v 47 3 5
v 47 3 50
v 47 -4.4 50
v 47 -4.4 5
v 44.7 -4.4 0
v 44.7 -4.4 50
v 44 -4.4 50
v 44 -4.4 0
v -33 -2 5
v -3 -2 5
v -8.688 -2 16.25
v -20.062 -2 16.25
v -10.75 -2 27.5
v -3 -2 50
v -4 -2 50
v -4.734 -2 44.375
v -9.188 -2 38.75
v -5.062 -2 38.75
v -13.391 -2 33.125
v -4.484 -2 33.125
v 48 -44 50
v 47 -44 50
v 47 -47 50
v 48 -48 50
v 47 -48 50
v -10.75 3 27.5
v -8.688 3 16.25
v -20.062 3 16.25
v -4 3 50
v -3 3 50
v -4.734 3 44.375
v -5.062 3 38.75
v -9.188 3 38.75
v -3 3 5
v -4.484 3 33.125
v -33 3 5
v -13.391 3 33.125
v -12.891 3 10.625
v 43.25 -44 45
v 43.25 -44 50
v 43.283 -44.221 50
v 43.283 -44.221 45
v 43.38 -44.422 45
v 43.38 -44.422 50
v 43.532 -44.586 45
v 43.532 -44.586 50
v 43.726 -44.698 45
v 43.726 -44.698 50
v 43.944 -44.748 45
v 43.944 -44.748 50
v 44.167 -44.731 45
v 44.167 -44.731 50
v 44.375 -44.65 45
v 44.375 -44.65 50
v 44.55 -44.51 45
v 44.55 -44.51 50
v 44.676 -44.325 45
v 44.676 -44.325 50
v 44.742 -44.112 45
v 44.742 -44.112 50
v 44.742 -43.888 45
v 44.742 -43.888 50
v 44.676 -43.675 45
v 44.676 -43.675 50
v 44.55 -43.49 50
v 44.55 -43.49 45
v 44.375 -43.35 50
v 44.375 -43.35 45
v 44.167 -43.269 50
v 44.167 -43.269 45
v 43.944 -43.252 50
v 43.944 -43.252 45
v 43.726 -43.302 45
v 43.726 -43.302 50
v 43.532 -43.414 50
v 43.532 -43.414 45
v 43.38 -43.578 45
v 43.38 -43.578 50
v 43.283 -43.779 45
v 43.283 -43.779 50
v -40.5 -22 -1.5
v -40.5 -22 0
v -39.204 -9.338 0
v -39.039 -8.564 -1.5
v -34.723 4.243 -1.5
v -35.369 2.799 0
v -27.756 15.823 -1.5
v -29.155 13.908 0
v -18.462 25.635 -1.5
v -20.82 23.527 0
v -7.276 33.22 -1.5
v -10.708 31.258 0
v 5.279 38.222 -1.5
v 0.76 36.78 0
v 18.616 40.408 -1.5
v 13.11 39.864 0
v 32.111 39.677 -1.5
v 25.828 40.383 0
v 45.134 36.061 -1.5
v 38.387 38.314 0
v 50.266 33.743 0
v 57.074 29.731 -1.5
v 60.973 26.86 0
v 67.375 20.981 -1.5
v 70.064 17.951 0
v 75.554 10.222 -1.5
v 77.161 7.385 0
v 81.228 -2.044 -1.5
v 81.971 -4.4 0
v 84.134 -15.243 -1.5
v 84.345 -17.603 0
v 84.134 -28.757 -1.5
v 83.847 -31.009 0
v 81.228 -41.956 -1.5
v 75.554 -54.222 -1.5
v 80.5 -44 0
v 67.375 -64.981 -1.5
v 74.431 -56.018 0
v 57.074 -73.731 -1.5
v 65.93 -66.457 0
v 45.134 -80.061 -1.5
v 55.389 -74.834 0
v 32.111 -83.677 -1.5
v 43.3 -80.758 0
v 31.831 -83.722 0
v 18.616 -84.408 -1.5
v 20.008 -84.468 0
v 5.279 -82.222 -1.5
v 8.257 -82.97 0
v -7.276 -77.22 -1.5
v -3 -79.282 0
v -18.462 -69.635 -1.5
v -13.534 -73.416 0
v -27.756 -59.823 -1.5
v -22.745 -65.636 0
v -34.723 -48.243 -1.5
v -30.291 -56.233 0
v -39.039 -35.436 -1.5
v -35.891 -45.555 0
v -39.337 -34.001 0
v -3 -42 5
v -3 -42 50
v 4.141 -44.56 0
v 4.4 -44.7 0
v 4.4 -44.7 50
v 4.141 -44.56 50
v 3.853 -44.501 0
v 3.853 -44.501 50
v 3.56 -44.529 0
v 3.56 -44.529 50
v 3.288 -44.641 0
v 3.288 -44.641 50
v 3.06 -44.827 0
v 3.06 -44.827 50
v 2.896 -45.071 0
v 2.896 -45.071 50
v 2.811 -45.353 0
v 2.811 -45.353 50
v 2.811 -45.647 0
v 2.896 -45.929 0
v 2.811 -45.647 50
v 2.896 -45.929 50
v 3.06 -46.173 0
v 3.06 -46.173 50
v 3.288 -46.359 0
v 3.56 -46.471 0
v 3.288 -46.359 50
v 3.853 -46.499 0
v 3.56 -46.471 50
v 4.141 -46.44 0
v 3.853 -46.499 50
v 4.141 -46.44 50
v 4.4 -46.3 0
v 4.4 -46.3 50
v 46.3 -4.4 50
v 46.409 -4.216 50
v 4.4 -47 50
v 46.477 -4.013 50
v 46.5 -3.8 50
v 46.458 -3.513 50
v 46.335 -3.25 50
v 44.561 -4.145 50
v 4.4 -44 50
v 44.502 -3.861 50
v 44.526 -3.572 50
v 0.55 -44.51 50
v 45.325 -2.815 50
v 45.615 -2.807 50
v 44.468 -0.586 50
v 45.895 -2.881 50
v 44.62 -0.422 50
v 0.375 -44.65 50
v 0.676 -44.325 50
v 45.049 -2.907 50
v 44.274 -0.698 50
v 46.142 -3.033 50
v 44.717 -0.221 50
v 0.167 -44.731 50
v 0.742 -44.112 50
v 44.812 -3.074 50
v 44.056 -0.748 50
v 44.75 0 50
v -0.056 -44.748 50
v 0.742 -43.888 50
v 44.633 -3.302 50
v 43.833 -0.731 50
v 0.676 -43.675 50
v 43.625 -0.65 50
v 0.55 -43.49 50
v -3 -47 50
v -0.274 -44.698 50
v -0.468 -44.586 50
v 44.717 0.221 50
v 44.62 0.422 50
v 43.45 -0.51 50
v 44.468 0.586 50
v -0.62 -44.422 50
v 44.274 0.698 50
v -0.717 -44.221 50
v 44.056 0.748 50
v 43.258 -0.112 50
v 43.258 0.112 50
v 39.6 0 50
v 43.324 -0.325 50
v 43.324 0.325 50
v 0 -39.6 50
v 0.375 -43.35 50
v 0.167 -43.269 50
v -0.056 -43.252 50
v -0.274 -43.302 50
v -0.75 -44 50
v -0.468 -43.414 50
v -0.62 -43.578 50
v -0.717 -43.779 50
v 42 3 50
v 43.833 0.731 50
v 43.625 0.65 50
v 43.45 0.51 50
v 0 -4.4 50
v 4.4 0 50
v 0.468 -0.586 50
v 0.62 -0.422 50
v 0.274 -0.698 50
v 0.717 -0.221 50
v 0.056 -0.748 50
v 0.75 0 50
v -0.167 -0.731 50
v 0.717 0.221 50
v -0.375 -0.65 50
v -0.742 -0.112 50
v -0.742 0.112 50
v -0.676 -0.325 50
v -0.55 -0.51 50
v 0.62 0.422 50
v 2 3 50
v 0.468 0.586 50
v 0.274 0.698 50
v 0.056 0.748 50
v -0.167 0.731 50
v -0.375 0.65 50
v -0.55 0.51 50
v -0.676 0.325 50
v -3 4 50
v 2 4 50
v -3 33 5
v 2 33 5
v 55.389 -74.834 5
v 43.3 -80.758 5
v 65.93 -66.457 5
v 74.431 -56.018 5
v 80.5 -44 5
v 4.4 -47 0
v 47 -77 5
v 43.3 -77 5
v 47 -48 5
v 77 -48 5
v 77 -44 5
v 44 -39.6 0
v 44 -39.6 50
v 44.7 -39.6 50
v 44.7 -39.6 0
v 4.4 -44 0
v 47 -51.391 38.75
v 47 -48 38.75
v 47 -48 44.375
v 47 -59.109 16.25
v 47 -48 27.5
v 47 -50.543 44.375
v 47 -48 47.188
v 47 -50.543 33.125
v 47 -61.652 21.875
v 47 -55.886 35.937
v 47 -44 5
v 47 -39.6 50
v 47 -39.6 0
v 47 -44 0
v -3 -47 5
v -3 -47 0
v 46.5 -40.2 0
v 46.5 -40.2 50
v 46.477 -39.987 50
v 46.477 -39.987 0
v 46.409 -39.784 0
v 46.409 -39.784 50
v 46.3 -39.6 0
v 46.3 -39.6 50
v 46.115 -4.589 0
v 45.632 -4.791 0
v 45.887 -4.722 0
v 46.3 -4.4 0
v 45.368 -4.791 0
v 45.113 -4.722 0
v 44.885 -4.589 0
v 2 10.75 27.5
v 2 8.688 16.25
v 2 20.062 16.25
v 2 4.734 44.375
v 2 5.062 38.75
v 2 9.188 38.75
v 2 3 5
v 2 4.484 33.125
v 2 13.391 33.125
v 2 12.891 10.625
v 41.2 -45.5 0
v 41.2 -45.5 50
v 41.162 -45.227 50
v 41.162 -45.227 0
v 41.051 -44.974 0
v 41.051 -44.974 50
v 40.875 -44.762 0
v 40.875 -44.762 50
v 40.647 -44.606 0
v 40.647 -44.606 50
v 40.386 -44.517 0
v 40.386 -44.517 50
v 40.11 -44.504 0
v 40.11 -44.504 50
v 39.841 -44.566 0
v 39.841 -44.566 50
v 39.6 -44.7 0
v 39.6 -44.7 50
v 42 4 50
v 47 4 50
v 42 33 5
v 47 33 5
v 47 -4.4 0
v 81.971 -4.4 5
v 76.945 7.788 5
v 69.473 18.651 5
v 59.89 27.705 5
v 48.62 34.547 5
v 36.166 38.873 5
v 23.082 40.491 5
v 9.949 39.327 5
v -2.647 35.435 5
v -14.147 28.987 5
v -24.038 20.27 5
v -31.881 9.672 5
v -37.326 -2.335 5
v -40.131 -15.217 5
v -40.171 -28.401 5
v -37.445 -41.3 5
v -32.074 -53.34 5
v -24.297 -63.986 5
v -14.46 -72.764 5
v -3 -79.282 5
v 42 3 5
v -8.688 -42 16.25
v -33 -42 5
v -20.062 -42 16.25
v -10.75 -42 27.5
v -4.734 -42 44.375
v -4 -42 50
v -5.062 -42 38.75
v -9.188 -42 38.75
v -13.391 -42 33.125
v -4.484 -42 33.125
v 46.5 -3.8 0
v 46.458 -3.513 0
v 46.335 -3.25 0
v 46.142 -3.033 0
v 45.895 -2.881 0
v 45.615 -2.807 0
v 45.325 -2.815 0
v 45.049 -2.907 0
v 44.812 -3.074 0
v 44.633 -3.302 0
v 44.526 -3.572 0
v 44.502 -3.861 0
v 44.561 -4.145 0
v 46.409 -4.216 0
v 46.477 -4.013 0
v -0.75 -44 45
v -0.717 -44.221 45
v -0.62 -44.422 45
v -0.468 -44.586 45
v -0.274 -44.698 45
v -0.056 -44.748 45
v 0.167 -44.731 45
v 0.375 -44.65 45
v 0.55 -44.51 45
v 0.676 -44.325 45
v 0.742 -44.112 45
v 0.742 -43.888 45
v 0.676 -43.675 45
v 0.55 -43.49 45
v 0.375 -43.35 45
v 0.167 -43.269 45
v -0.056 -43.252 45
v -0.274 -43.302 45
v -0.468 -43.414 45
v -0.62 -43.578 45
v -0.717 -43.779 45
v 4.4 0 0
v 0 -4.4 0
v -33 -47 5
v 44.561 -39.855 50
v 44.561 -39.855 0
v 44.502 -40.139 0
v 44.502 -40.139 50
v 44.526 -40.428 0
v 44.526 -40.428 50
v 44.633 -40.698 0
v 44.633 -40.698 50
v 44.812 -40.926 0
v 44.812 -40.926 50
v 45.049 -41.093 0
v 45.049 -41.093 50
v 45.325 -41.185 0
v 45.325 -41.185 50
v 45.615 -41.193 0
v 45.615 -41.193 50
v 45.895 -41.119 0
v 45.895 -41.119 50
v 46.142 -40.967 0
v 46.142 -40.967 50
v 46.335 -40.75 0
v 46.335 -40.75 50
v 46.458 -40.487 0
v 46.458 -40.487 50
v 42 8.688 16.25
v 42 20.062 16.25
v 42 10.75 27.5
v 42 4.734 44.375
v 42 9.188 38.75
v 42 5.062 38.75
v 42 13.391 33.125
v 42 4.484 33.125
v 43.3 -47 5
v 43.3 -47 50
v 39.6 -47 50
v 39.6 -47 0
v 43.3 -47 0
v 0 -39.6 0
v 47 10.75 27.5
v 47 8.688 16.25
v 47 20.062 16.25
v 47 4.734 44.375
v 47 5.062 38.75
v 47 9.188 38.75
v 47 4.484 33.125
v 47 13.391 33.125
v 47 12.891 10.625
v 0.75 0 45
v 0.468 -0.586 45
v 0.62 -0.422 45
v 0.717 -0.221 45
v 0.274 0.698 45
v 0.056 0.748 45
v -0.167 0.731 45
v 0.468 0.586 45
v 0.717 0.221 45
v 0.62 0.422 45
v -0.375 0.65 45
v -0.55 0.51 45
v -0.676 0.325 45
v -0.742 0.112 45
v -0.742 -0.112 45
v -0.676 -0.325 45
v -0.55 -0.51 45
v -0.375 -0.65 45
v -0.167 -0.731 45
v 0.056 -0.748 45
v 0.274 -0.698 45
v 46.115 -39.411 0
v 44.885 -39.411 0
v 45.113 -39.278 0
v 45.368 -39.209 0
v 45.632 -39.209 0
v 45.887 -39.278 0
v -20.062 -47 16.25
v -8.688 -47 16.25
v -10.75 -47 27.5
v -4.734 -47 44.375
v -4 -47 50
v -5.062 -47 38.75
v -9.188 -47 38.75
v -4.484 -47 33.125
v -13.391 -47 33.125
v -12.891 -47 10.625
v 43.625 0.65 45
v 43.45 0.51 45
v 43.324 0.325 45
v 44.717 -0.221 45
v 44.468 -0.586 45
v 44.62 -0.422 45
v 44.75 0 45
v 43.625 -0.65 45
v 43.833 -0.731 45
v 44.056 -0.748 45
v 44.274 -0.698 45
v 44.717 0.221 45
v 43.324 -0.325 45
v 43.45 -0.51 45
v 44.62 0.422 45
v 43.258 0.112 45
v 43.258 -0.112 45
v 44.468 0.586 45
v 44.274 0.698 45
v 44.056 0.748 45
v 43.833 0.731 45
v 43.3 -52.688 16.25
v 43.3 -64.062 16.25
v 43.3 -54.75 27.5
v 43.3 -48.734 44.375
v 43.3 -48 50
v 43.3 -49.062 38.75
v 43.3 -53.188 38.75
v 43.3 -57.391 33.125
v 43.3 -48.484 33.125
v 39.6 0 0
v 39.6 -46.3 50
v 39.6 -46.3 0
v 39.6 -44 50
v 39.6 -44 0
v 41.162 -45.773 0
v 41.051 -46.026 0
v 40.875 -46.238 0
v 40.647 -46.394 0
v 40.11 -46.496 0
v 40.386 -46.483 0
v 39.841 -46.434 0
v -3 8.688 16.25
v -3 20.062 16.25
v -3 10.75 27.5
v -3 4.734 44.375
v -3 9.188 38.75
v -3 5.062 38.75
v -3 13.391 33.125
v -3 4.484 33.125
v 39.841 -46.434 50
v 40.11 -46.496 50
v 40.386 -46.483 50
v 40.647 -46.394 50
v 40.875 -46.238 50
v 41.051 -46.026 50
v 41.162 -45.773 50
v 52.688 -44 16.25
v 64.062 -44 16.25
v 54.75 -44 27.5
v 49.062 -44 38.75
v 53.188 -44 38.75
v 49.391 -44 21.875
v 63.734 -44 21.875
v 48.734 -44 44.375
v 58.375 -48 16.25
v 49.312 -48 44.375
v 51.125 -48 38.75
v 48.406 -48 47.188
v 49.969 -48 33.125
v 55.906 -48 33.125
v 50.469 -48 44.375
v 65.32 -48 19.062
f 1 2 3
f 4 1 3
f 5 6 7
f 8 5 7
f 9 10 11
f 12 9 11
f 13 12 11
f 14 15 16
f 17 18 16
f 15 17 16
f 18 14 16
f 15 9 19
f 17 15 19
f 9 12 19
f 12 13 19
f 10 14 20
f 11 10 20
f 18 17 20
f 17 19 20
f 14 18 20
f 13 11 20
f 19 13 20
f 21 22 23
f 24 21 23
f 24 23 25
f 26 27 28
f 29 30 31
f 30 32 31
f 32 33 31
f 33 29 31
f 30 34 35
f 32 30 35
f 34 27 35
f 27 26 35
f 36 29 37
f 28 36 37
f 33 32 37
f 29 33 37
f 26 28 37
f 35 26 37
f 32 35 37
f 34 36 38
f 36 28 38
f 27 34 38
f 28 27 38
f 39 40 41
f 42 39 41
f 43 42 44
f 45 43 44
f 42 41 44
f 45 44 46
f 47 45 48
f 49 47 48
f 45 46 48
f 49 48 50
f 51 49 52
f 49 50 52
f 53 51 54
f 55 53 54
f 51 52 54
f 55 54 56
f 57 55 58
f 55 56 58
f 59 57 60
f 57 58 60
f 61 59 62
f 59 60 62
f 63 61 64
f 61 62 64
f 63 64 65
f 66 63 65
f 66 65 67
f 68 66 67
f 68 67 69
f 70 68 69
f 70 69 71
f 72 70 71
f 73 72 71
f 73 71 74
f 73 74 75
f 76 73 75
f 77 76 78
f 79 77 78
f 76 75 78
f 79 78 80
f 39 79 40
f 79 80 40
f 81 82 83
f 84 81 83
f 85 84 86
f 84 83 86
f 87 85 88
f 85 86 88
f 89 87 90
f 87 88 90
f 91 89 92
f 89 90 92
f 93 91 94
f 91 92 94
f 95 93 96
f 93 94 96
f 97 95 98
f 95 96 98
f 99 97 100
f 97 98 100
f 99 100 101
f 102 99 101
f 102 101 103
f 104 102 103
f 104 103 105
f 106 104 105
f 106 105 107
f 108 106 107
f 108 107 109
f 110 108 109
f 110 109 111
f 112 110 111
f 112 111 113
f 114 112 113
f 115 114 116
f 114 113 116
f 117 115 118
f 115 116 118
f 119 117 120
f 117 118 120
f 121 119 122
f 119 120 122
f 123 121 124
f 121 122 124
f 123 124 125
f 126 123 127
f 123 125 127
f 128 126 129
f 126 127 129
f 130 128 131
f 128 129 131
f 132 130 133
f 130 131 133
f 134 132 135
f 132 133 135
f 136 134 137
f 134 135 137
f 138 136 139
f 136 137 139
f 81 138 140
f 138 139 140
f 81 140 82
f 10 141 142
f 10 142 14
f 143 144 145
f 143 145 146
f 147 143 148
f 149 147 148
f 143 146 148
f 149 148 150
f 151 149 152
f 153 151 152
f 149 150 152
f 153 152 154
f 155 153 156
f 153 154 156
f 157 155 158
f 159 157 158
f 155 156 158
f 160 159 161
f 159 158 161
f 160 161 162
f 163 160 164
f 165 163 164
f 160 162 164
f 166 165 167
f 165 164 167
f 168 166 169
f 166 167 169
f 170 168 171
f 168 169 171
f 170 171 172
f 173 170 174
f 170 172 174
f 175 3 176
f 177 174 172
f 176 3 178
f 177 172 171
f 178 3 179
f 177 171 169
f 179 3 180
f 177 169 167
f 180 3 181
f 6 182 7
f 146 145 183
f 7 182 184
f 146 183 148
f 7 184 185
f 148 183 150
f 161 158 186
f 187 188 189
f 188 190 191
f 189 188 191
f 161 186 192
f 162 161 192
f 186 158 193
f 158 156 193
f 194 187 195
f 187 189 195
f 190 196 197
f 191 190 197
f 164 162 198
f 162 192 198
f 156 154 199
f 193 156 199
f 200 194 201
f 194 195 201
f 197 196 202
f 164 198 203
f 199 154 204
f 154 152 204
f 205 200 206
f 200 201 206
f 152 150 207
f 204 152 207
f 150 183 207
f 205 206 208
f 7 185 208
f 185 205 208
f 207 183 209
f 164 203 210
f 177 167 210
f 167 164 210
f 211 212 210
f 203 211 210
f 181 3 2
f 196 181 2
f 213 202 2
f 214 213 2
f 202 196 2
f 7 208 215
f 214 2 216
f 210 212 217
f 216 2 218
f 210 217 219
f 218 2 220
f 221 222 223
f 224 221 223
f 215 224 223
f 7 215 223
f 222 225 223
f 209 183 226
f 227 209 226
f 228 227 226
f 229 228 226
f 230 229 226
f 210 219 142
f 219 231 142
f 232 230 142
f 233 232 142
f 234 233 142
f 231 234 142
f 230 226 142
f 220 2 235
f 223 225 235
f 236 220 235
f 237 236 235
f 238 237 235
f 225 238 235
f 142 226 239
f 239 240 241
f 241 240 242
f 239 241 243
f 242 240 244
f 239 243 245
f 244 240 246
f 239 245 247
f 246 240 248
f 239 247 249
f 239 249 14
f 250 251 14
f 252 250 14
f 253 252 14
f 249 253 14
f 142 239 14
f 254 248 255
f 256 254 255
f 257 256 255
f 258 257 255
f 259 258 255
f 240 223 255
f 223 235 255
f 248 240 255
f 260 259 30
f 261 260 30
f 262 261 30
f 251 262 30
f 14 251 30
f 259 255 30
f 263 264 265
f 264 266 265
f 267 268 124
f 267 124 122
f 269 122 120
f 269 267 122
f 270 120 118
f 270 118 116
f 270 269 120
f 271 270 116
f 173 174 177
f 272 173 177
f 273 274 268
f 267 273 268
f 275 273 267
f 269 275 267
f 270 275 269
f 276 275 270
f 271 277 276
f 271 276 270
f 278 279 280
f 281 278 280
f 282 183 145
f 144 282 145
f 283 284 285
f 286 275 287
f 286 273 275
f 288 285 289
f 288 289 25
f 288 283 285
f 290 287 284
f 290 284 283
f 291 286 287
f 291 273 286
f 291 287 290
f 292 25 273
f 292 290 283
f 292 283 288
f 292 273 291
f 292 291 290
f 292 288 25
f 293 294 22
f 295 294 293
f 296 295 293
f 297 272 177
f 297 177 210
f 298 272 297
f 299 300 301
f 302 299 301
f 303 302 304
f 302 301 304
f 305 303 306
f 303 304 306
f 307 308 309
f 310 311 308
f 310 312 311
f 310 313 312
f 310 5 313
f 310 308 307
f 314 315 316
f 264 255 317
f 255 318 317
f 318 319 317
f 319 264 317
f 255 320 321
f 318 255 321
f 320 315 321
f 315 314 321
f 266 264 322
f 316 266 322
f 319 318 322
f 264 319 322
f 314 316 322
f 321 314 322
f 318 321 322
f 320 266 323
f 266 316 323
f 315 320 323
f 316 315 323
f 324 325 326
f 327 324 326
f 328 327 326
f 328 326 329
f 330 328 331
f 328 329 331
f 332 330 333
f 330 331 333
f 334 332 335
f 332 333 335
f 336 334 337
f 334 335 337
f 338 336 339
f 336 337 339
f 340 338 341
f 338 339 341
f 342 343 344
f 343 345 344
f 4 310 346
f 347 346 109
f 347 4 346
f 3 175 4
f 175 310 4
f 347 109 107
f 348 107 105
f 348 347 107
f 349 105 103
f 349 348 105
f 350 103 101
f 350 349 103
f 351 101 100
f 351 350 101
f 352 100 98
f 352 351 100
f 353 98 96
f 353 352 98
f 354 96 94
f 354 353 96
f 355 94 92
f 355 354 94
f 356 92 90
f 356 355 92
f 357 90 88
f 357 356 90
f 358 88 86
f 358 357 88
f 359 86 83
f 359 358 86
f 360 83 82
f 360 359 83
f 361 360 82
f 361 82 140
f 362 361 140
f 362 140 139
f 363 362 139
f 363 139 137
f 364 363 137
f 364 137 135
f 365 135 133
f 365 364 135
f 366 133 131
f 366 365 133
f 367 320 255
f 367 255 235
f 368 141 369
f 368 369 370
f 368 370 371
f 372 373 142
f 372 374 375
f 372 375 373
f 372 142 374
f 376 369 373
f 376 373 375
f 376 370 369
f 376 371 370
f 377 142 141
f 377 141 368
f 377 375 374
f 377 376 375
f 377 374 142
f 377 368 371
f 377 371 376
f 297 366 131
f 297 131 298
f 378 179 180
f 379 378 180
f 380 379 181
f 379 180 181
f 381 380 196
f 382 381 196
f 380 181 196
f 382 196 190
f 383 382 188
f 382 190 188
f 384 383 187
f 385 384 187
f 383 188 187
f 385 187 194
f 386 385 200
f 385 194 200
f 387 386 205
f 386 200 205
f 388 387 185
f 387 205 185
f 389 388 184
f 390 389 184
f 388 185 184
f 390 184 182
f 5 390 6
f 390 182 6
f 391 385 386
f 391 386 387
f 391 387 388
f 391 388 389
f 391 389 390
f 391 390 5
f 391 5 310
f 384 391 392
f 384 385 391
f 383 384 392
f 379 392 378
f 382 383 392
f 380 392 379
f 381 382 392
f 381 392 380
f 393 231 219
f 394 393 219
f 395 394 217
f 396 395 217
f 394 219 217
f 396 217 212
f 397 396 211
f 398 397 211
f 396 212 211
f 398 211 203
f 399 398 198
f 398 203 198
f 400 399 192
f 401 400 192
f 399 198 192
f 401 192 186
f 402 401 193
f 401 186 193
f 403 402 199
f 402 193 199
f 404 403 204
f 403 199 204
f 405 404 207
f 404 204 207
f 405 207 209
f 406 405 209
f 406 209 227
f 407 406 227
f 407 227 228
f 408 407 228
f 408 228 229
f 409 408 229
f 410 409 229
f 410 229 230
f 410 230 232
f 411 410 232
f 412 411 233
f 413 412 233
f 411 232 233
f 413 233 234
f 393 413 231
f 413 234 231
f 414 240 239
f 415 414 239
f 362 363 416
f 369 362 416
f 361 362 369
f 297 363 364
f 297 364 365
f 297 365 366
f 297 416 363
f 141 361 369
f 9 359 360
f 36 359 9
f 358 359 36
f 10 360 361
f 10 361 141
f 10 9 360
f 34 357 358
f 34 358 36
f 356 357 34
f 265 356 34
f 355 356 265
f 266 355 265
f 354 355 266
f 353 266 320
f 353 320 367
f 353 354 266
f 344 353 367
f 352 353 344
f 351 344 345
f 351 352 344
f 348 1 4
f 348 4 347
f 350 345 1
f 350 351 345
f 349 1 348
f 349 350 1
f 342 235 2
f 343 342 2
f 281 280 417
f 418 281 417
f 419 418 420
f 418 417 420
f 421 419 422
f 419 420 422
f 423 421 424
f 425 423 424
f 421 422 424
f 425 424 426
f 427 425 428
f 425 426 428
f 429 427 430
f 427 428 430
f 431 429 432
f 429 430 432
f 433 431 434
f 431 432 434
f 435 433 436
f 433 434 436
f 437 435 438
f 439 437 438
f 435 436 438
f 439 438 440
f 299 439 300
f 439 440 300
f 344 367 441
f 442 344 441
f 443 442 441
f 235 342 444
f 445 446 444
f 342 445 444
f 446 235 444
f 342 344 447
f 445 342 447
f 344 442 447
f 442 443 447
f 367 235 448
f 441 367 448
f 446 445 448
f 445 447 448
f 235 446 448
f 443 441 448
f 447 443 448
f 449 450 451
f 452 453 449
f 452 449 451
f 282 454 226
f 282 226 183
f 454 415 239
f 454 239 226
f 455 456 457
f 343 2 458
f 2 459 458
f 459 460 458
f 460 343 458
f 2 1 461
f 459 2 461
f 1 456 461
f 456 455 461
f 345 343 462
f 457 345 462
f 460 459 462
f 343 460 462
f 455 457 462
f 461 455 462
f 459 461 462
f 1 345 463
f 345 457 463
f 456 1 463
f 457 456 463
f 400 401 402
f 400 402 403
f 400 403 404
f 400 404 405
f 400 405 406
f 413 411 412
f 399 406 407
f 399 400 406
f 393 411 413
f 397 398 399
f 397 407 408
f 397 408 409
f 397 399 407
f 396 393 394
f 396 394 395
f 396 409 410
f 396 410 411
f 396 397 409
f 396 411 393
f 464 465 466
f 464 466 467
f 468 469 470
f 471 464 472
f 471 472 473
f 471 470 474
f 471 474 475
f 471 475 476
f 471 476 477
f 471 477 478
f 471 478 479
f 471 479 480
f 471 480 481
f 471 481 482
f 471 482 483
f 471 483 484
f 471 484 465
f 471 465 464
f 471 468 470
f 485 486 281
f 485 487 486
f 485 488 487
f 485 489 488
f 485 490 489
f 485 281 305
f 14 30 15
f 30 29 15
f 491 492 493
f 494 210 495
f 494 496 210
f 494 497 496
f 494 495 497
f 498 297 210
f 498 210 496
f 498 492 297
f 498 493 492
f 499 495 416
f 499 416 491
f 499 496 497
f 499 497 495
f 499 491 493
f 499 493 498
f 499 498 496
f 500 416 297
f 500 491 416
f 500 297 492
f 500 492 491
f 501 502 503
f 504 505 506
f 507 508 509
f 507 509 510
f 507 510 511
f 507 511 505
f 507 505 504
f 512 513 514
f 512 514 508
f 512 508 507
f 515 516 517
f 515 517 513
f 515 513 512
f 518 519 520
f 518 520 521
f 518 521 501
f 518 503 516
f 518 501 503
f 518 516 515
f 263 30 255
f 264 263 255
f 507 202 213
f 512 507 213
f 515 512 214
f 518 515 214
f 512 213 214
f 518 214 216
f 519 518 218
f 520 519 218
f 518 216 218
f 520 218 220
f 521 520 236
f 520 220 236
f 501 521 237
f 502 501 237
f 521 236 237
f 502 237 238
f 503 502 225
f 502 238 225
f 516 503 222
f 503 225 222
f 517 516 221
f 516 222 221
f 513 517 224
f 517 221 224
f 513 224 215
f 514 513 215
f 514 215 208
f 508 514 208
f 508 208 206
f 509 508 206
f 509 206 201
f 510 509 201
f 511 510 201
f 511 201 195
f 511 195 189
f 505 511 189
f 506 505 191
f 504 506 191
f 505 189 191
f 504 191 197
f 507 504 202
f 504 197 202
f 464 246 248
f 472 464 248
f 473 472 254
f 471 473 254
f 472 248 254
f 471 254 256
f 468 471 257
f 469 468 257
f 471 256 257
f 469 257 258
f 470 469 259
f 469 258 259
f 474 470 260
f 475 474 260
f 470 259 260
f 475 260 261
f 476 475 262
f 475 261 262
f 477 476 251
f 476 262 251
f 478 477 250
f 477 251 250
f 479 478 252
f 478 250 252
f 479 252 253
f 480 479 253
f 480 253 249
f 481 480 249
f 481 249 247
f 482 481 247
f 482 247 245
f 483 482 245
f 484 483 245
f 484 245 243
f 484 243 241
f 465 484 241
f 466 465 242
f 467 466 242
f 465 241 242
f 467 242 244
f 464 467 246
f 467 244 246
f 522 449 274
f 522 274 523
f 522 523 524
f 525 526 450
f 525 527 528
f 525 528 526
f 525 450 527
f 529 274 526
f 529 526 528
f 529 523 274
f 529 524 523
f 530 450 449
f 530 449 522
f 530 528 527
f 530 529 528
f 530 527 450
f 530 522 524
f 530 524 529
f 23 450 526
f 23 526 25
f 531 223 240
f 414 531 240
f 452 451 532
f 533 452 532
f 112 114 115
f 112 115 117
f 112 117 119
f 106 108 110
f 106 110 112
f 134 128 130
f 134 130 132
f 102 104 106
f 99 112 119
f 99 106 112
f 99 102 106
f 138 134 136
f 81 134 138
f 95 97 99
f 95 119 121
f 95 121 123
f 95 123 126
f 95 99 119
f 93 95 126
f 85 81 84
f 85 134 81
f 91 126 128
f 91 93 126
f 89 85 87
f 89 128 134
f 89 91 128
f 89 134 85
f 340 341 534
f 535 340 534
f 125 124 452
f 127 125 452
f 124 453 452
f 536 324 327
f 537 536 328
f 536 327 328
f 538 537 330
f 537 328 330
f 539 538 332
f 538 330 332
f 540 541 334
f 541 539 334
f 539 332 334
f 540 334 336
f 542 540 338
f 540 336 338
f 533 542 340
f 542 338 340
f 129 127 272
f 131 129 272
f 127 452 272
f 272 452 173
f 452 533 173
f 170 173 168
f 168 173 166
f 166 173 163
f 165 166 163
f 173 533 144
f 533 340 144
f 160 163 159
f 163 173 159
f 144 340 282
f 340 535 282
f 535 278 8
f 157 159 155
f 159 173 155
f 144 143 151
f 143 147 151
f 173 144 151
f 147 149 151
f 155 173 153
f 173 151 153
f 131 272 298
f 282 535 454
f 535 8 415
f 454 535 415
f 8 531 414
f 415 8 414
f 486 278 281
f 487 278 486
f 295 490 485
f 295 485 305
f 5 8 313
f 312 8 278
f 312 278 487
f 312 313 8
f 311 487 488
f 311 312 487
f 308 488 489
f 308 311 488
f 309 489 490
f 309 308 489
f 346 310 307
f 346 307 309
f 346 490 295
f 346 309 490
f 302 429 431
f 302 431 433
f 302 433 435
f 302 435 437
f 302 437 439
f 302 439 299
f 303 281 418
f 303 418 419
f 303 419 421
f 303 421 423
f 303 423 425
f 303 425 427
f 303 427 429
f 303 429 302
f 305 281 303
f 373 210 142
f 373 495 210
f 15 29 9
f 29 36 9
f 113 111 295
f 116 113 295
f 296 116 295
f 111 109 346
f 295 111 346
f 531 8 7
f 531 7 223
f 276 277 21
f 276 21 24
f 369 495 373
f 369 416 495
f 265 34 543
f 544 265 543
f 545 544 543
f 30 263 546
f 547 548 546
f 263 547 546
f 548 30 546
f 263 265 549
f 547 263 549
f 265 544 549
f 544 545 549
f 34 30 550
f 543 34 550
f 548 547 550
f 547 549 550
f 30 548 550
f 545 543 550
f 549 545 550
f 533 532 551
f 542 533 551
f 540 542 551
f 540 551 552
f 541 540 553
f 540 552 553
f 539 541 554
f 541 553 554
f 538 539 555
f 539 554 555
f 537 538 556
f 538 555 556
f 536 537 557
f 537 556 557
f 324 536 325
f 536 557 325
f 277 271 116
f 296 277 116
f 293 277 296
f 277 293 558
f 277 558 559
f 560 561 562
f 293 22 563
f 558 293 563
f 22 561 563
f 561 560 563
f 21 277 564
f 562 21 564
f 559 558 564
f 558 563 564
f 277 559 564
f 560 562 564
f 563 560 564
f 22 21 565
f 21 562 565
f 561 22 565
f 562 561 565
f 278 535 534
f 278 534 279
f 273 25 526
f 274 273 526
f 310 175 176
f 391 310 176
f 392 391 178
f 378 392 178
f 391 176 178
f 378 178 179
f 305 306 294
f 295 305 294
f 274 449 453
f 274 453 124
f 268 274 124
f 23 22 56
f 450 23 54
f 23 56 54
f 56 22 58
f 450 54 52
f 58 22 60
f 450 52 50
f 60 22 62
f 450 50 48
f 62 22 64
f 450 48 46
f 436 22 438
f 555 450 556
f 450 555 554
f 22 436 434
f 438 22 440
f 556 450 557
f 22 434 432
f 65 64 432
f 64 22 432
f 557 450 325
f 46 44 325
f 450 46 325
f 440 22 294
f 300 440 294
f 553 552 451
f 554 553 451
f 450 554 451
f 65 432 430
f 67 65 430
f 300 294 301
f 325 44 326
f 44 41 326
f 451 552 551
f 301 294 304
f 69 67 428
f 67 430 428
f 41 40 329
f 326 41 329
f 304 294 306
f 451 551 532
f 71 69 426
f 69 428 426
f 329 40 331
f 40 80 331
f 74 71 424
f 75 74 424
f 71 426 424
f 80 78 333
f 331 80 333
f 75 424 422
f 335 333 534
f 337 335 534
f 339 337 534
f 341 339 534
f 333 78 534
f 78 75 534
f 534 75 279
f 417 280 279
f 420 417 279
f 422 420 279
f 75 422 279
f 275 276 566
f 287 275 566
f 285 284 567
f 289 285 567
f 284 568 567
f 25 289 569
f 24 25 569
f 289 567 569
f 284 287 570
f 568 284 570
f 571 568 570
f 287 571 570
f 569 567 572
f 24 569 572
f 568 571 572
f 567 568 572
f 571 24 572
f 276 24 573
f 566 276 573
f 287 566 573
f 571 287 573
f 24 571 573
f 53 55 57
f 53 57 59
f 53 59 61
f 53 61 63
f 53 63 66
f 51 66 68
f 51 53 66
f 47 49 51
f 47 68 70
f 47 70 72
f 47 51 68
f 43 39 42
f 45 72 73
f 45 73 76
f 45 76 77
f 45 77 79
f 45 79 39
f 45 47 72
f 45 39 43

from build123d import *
from build123d.topology import SkipClean

# Parameters (mm, degrees)
EXTRUDE_2_DEPTH     = 50
CUT_EXTRUDE_1_DEPTH = 52
SKETCH_3_R          = 62.5
EXTRUDE_3_DEPTH     = 1.5
EXTRUDE_START       = 5
EXTRUDE_5_DEPTH     = 5
EXTRUDE_6_DEPTH     = 47
CUT_EXTRUDE_2_DEPTH = 50
EXTRUDE_7_REACH     = 132.126
SKETCH_12_R         = 0.75
CUT_EXTRUDE_3_DEPTH = 5


with BuildPart() as part:
    # 草图1 → 凸台-拉伸2 (new body)
    # profile 1 of 3: a face of its own
    with BuildSketch(Plane.XY):
        Polygon((-3, -40.842640687), (-3, -47), (3.157359313, -47), align=None)
    # profile 2 of 3: a face of its own
    with BuildSketch(Plane.XY):
        Polygon((-3, -3.157359313), (3.157359313, 3), (40.842640687, 3), (47, -3.157359313), (47, -40.842640687), (40.842640687, -47), (3.157359313, -47), (-3, -40.842640687), align=None)
        Polygon((0, -39.6), (4.4, -44), (39.6, -44), (44, -39.6), (44, -4.4), (39.6, 0), (4.4, 0), (0, -4.4), align=None, mode=Mode.SUBTRACT)
    # profile 3 of 3: a face of its own
    with BuildSketch(Plane.XY):
        Polygon((47, -47), (40.842640687, -47), (47, -40.842640687), align=None)
    extrude(amount=EXTRUDE_2_DEPTH)

    # 草图2 → 切除-拉伸1 (cut)
    with BuildSketch(Plane.XY.offset(50)):
        with BuildLine():
            ThreePointArc((4.8, -45.5), (4.694427191, -45.052786405), (4.4, -44.7))
            Line((4.4, -44.7), (4.4, -46.3))
            ThreePointArc((4.4, -46.3), (4.694427191, -45.947213595), (4.8, -45.5))
        make_face()
        with BuildLine():
            Line((4.4, -46.3), (4.4, -44.7))
            ThreePointArc((4.4, -44.7), (2.8, -45.5), (4.4, -46.3))
        make_face()
        with BuildLine():
            ThreePointArc((4.8, -45.5), (4.694427191, -45.052786405), (4.4, -44.7))
            Line((4.4, -44.7), (4.4, -46.3))
            ThreePointArc((4.4, -46.3), (4.694427191, -45.947213595), (4.8, -45.5))
        make_face()
        with BuildLine():
            Line((4.4, -46.3), (4.4, -44.7))
            ThreePointArc((4.4, -44.7), (2.8, -45.5), (4.4, -46.3))
        make_face()
        with BuildLine():
            Line((39.6, -44), (4.4, -44))
            Line((4.4, -44), (4.4, -44.7))
            ThreePointArc((4.4, -44.7), (4.694427191, -45.052786405), (4.8, -45.5))
            ThreePointArc((4.8, -45.5), (4.694427191, -45.947213595), (4.4, -46.3))
            Line((4.4, -46.3), (4.4, -47))
            Line((4.4, -47), (39.6, -47))
            Line((39.6, -47), (39.6, -46.3))
            ThreePointArc((39.6, -46.3), (39.2, -45.5), (39.6, -44.7))
            Line((39.6, -44.7), (39.6, -44))
        make_face()
        with BuildLine():
            ThreePointArc((41.2, -45.5), (40.647213595, -44.605572809), (39.6, -44.7))
            Line((39.6, -44.7), (39.6, -46.3))
            ThreePointArc((39.6, -46.3), (40.647213595, -46.394427191), (41.2, -45.5))
        make_face()
        with BuildLine():
            Line((39.6, -46.3), (39.6, -44.7))
            ThreePointArc((39.6, -44.7), (39.2, -45.5), (39.6, -46.3))
        make_face()
        with BuildLine():
            ThreePointArc((41.2, -45.5), (40.647213595, -44.605572809), (39.6, -44.7))
            Line((39.6, -44.7), (39.6, -46.3))
            ThreePointArc((39.6, -46.3), (40.647213595, -46.394427191), (41.2, -45.5))
        make_face()
        with BuildLine():
            Line((39.6, -46.3), (39.6, -44.7))
            ThreePointArc((39.6, -44.7), (39.2, -45.5), (39.6, -46.3))
        make_face()
    extrude(amount=-CUT_EXTRUDE_1_DEPTH, mode=Mode.SUBTRACT)

    # 草图3 → 凸台-拉伸3 (add)
    with BuildSketch(Plane(origin=(0, 0, 0), x_dir=(-1, 0, 0), z_dir=(0, 0, -1))):
        with Locations((-22, -22)):
            Circle(SKETCH_3_R)
    extrude(amount=EXTRUDE_3_DEPTH)

    # 草图4 → 凸台-拉伸5 (add)
    with SkipClean():  # the faces are left unmerged after this step: merging them gives an invalid solid
        with BuildSketch(Plane.XY.offset(EXTRUDE_START)):
            with BuildLine():
                Line((-3, -79.282196187), (-3, -47))
                Line((-3, -47), (-3, -3.157359313))
                Line((-3, -3.157359313), (3.157359313, 3))
                Line((3.157359313, 3), (40.842640687, 3))
                Line((40.842640687, 3), (47, -3.157359313))
                Line((47, -3.157359313), (47, -4.4))
                Line((47, -4.4), (81.970742867, -4.4))
                ThreePointArc((81.970742867, -4.4), (-19.322802913, 24.890041154), (-3, -79.282196187))
            make_face()
            with BuildLine():
                Line((43.3, -47), (43.3, -80.758488748))
                ThreePointArc((43.3, -80.758488748), (65.929564348, -66.457208372), (80.5, -44))
                Line((80.5, -44), (47, -44))
                Line((47, -44), (47, -47))
                Line((47, -47), (43.3, -47))
            make_face()
        extrude(amount=-EXTRUDE_5_DEPTH)

    # 草图8 → 凸台-拉伸6 (add)
    with SkipClean():  # the faces are left unmerged after this step: merging them gives an invalid solid
        with BuildSketch(Plane.XY.offset(50)):
            Polygon((47, 3), (47, -3.157359313), (40.842640687, 3), align=None)
        extrude(amount=-EXTRUDE_6_DEPTH)

    # 草图9 → 切除-拉伸2 (cut)
    with SkipClean():  # the faces are left unmerged after this step: merging them gives an invalid solid
        with BuildSketch(Plane.XY.offset(50)):
            with BuildLine():
                Line((44, -4.4), (44, -39.6))
                Line((44, -39.6), (44.7, -39.6))
                ThreePointArc((44.7, -39.6), (45.5, -39.2), (46.3, -39.6))
                Line((46.3, -39.6), (47, -39.6))
                Line((47, -39.6), (47, -4.4))
                Line((47, -4.4), (46.3, -4.4))
                ThreePointArc((46.3, -4.4), (45.5, -4.8), (44.7, -4.4))
                Line((44.7, -4.4), (44, -4.4))
            make_face()
            with BuildLine():
                ThreePointArc((46.5, -3.8), (45.183772234, -2.851316702), (44.7, -4.4))
                Line((44.7, -4.4), (46.3, -4.4))
                ThreePointArc((46.3, -4.4), (46.448683298, -4.116227766), (46.5, -3.8))
            make_face()
            with BuildLine():
                Line((46.3, -4.4), (44.7, -4.4))
                ThreePointArc((44.7, -4.4), (45.5, -4.8), (46.3, -4.4))
            make_face()
            with BuildLine():
                ThreePointArc((46.5, -3.8), (45.183772234, -2.851316702), (44.7, -4.4))
                Line((44.7, -4.4), (46.3, -4.4))
                ThreePointArc((46.3, -4.4), (46.448683298, -4.116227766), (46.5, -3.8))
            make_face()
            with BuildLine():
                Line((46.3, -4.4), (44.7, -4.4))
                ThreePointArc((44.7, -4.4), (45.5, -4.8), (46.3, -4.4))
            make_face()
            with BuildLine():
                ThreePointArc((46.3, -39.6), (45.5, -39.2), (44.7, -39.6))
                Line((44.7, -39.6), (46.3, -39.6))
            make_face()
            with BuildLine():
                Line((46.3, -39.6), (44.7, -39.6))
                ThreePointArc((44.7, -39.6), (45.183772234, -41.148683298), (46.5, -40.2))
                ThreePointArc((46.5, -40.2), (46.448683298, -39.883772234), (46.3, -39.6))
            make_face()
            with BuildLine():
                ThreePointArc((46.3, -39.6), (45.5, -39.2), (44.7, -39.6))
                Line((44.7, -39.6), (46.3, -39.6))
            make_face()
            with BuildLine():
                Line((46.3, -39.6), (44.7, -39.6))
                ThreePointArc((44.7, -39.6), (45.183772234, -41.148683298), (46.5, -40.2))
                ThreePointArc((46.5, -40.2), (46.448683298, -39.883772234), (46.3, -39.6))
            make_face()
        extrude(amount=-CUT_EXTRUDE_2_DEPTH, mode=Mode.SUBTRACT)

    # 草图11 → 凸台-拉伸7 (add, up to next)
    with BuildSketch(Plane.XY.offset(50), mode=Mode.PRIVATE) as extrude_7_sk1:
        Polygon((-3, 3), (3.157359313, 3), (-3, -3.157359313), align=None)
    extrude_7_tool1 = extrude(extrude_7_sk1.sketch, amount=-EXTRUDE_7_REACH, mode=Mode.PRIVATE) - part.part
    add(extrude_7_tool1.solids().sort_by_distance((-0.947547, 0.947547, 50))[0])

    # 草图12 → 切除-拉伸3 (cut)
    with SkipClean():  # the faces are left unmerged after this step: merging them gives an invalid solid
        with BuildSketch(Plane.XY.offset(50)):
            Circle(SKETCH_12_R)
            with Locations((44, 0)):
                Circle(SKETCH_12_R)
            with Locations(Location((0, -44, 0), (0, 0, 180))):
                Circle(SKETCH_12_R)
            with Locations(Location((44, -44, 0), (0, 0, 180))):
                Circle(SKETCH_12_R)
        extrude(amount=-CUT_EXTRUDE_3_DEPTH, mode=Mode.SUBTRACT)

    # 草图14 → 放样3 section 0
    with SkipClean():  # the faces are left unmerged after this step: merging them gives an invalid solid
        with BuildSketch(Plane.XY.offset(50)):
            with BuildLine():
                Line((43.3, -47), (47, -47))
                Line((47, -47), (47, -48))
                Line((47, -48), (43.3, -48))
                Line((43.3, -48), (43.3, -47))
            make_face()
        # 草图13 → 放样3 section 1
        with BuildSketch(Plane.XY.offset(5)):
            with BuildLine():
                Line((47, -47), (43.3, -47))
                Line((43.3, -47), (43.3, -77))
                Line((43.3, -77), (47, -77))
                Line((47, -77), (47, -47))
            make_face()
        loft()

    # 草图15 → 放样4 section 0
    with SkipClean():  # the faces are left unmerged after this step: merging them gives an invalid solid
        with BuildSketch(Plane.XY.offset(5)):
            with BuildLine():
                Line((47, -44), (77, -44))
                Line((77, -44), (77, -48))
                Line((77, -48), (47, -48))
                Line((47, -48), (47, -44))
            make_face()
        # 草图16 → 放样4 section 1
        with BuildSketch(Plane.XY.offset(50)):
            with BuildLine():
                Line((47, -48), (48, -48))
                Line((48, -48), (48, -44))
                Line((48, -44), (47, -44))
                Line((47, -44), (47, -48))
            make_face()
        loft()

    # 草图18 → 放样5 section 0
    with SkipClean():  # the faces are left unmerged after this step: merging them gives an invalid solid
        with BuildSketch(Plane.XY.offset(50)):
            with BuildLine():
                Line((-3, 3), (-4, 3))
                Line((-4, 3), (-4, -2))
                Line((-4, -2), (-3, -2))
                Line((-3, -2), (-3, 3))
            make_face()
        # 草图17 → 放样5 section 1
        with BuildSketch(Plane.XY.offset(5)):
            with BuildLine():
                Line((-3, 3), (-33, 3))
                Line((-33, 3), (-33, -2))
                Line((-33, -2), (-3, -2))
                Line((-3, -2), (-3, 3))
            make_face()
        loft()

    # 草图20 → 放样6 section 0
    with SkipClean():  # the faces are left unmerged after this step: merging them gives an invalid solid
        with BuildSketch(Plane.XY.offset(50)):
            with BuildLine():
                Line((42, 3), (47, 3))
                Line((47, 3), (47, 4))
                Line((47, 4), (42, 4))
                Line((42, 4), (42, 3))
            make_face()
        # 草图19 → 放样6 section 1
        with BuildSketch(Plane.XY.offset(5)):
            with BuildLine():
                Line((47, 3), (42, 3))
                Line((42, 3), (42, 33))
                Line((42, 33), (47, 33))
                Line((47, 33), (47, 3))
            make_face()
        loft()

    # 草图22 → 放样7 section 0
    with SkipClean():  # the faces are left unmerged after this step: merging them gives an invalid solid
        with BuildSketch(Plane.XY.offset(50)):
            with BuildLine():
                Line((-3, -47), (-4, -47))
                Line((-4, -47), (-4, -42))
                Line((-4, -42), (-3, -42))
                Line((-3, -42), (-3, -47))
            make_face()
        # 草图21 → 放样7 section 1
        with BuildSketch(Plane.XY.offset(5)):
            with BuildLine():
                Line((-3, -47), (-33, -47))
                Line((-33, -47), (-33, -42))
                Line((-33, -42), (-3, -42))
                Line((-3, -42), (-3, -47))
            make_face()
        loft()

    # 草图24 → 放样9 section 0
    with SkipClean():  # the faces are left unmerged after this step: merging them gives an invalid solid
        with BuildSketch(Plane.XY.offset(50)):
            with BuildLine():
                Line((-3, 3), (2, 3))
                Line((2, 3), (2, 4))
                Line((2, 4), (-3, 4))
                Line((-3, 4), (-3, 3))
            make_face()
        # 草图23 → 放样9 section 1
        with BuildSketch(Plane.XY.offset(5)):
            with BuildLine():
                Line((-3, 3), (2, 3))
                Line((2, 3), (2, 33))
                Line((2, 33), (-3, 33))
                Line((-3, 33), (-3, 3))
            make_face()
        loft()


solid = part.part
